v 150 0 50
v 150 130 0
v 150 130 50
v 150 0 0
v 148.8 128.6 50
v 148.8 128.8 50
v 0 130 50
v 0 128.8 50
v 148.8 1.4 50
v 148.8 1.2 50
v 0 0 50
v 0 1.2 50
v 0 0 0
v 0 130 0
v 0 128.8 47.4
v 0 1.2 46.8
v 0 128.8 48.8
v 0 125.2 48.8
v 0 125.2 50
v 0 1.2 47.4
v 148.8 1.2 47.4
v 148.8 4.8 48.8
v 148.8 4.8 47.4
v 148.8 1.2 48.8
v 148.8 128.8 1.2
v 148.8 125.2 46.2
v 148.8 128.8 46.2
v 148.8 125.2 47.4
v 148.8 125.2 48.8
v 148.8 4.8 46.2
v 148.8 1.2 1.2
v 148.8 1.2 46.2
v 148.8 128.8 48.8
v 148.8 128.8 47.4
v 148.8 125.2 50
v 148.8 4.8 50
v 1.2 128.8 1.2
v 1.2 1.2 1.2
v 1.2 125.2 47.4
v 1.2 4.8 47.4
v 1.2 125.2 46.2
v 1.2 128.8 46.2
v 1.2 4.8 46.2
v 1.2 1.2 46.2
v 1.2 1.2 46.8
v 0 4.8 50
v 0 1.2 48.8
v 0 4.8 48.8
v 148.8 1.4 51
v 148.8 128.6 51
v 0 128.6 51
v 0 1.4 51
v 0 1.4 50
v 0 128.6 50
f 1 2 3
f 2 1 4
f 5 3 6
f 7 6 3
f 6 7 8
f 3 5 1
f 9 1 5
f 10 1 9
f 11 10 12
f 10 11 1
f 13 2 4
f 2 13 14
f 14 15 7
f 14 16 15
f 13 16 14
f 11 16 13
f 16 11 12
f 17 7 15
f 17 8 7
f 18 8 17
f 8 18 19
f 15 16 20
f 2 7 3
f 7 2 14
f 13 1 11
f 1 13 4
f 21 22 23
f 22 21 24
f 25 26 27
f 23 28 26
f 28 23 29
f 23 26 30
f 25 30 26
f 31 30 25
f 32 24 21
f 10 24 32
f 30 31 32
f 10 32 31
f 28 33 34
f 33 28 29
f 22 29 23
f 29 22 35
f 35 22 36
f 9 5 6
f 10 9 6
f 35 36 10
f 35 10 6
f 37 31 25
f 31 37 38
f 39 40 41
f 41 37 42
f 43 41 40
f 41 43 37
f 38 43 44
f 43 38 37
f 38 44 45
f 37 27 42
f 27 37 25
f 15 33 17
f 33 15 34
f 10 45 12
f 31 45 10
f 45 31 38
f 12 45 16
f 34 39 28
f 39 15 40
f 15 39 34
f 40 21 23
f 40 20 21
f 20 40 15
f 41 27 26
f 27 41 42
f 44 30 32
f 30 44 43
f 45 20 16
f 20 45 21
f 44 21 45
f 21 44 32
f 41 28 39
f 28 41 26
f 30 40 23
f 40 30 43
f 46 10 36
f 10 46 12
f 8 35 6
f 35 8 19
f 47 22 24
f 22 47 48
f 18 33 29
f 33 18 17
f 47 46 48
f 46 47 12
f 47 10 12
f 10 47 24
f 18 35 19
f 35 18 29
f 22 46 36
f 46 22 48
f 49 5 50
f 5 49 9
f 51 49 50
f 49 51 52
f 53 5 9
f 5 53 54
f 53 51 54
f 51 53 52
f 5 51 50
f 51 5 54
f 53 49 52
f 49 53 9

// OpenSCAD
module hollow(size=[10,10,10],thickness = 1){
    
   difference(){
cube([size[0],size[1],size[2]]);
    translate([thickness,thickness,thickness])
cube([size[0]-thickness * 2,size[1]-thickness * 2,size[2]]);
} 
    
}

module box(){
difference(){
hollow(size= [200-50,130,50],thickness = 1.2);

translate([-2,1.2,48.8-2])
cube([50,127.6,4]);}

translate([0,1.2,48.8-2.6])
difference(){
cube([150,127.6,1.2]);
    translate([1.2,3.6,0])
    cube([150 - 2.4,127.6-7.2,1.2]);
    
    }
    
    
translate([0,1.2,48.8-2.4+2.4])
difference(){
cube([150,127.6,1.2]);
    translate([1.2,3.6,0])
    cube([150 - 2.4,127.6-7.2,1.2]);
    translate([0,3.6,0])
    cube([1.2,127.6-7.2,1.2]);
    }
    
};
  
box();
// translate([0,1.2,50])
//cube([150-1.2,130-2.4,1]);  //LID

//color("red")
//translate([-0,1.2,48.8-2.4+2.4])
translate([0,1.4,50])
cube([150-1.2,130-2.8,1]);
